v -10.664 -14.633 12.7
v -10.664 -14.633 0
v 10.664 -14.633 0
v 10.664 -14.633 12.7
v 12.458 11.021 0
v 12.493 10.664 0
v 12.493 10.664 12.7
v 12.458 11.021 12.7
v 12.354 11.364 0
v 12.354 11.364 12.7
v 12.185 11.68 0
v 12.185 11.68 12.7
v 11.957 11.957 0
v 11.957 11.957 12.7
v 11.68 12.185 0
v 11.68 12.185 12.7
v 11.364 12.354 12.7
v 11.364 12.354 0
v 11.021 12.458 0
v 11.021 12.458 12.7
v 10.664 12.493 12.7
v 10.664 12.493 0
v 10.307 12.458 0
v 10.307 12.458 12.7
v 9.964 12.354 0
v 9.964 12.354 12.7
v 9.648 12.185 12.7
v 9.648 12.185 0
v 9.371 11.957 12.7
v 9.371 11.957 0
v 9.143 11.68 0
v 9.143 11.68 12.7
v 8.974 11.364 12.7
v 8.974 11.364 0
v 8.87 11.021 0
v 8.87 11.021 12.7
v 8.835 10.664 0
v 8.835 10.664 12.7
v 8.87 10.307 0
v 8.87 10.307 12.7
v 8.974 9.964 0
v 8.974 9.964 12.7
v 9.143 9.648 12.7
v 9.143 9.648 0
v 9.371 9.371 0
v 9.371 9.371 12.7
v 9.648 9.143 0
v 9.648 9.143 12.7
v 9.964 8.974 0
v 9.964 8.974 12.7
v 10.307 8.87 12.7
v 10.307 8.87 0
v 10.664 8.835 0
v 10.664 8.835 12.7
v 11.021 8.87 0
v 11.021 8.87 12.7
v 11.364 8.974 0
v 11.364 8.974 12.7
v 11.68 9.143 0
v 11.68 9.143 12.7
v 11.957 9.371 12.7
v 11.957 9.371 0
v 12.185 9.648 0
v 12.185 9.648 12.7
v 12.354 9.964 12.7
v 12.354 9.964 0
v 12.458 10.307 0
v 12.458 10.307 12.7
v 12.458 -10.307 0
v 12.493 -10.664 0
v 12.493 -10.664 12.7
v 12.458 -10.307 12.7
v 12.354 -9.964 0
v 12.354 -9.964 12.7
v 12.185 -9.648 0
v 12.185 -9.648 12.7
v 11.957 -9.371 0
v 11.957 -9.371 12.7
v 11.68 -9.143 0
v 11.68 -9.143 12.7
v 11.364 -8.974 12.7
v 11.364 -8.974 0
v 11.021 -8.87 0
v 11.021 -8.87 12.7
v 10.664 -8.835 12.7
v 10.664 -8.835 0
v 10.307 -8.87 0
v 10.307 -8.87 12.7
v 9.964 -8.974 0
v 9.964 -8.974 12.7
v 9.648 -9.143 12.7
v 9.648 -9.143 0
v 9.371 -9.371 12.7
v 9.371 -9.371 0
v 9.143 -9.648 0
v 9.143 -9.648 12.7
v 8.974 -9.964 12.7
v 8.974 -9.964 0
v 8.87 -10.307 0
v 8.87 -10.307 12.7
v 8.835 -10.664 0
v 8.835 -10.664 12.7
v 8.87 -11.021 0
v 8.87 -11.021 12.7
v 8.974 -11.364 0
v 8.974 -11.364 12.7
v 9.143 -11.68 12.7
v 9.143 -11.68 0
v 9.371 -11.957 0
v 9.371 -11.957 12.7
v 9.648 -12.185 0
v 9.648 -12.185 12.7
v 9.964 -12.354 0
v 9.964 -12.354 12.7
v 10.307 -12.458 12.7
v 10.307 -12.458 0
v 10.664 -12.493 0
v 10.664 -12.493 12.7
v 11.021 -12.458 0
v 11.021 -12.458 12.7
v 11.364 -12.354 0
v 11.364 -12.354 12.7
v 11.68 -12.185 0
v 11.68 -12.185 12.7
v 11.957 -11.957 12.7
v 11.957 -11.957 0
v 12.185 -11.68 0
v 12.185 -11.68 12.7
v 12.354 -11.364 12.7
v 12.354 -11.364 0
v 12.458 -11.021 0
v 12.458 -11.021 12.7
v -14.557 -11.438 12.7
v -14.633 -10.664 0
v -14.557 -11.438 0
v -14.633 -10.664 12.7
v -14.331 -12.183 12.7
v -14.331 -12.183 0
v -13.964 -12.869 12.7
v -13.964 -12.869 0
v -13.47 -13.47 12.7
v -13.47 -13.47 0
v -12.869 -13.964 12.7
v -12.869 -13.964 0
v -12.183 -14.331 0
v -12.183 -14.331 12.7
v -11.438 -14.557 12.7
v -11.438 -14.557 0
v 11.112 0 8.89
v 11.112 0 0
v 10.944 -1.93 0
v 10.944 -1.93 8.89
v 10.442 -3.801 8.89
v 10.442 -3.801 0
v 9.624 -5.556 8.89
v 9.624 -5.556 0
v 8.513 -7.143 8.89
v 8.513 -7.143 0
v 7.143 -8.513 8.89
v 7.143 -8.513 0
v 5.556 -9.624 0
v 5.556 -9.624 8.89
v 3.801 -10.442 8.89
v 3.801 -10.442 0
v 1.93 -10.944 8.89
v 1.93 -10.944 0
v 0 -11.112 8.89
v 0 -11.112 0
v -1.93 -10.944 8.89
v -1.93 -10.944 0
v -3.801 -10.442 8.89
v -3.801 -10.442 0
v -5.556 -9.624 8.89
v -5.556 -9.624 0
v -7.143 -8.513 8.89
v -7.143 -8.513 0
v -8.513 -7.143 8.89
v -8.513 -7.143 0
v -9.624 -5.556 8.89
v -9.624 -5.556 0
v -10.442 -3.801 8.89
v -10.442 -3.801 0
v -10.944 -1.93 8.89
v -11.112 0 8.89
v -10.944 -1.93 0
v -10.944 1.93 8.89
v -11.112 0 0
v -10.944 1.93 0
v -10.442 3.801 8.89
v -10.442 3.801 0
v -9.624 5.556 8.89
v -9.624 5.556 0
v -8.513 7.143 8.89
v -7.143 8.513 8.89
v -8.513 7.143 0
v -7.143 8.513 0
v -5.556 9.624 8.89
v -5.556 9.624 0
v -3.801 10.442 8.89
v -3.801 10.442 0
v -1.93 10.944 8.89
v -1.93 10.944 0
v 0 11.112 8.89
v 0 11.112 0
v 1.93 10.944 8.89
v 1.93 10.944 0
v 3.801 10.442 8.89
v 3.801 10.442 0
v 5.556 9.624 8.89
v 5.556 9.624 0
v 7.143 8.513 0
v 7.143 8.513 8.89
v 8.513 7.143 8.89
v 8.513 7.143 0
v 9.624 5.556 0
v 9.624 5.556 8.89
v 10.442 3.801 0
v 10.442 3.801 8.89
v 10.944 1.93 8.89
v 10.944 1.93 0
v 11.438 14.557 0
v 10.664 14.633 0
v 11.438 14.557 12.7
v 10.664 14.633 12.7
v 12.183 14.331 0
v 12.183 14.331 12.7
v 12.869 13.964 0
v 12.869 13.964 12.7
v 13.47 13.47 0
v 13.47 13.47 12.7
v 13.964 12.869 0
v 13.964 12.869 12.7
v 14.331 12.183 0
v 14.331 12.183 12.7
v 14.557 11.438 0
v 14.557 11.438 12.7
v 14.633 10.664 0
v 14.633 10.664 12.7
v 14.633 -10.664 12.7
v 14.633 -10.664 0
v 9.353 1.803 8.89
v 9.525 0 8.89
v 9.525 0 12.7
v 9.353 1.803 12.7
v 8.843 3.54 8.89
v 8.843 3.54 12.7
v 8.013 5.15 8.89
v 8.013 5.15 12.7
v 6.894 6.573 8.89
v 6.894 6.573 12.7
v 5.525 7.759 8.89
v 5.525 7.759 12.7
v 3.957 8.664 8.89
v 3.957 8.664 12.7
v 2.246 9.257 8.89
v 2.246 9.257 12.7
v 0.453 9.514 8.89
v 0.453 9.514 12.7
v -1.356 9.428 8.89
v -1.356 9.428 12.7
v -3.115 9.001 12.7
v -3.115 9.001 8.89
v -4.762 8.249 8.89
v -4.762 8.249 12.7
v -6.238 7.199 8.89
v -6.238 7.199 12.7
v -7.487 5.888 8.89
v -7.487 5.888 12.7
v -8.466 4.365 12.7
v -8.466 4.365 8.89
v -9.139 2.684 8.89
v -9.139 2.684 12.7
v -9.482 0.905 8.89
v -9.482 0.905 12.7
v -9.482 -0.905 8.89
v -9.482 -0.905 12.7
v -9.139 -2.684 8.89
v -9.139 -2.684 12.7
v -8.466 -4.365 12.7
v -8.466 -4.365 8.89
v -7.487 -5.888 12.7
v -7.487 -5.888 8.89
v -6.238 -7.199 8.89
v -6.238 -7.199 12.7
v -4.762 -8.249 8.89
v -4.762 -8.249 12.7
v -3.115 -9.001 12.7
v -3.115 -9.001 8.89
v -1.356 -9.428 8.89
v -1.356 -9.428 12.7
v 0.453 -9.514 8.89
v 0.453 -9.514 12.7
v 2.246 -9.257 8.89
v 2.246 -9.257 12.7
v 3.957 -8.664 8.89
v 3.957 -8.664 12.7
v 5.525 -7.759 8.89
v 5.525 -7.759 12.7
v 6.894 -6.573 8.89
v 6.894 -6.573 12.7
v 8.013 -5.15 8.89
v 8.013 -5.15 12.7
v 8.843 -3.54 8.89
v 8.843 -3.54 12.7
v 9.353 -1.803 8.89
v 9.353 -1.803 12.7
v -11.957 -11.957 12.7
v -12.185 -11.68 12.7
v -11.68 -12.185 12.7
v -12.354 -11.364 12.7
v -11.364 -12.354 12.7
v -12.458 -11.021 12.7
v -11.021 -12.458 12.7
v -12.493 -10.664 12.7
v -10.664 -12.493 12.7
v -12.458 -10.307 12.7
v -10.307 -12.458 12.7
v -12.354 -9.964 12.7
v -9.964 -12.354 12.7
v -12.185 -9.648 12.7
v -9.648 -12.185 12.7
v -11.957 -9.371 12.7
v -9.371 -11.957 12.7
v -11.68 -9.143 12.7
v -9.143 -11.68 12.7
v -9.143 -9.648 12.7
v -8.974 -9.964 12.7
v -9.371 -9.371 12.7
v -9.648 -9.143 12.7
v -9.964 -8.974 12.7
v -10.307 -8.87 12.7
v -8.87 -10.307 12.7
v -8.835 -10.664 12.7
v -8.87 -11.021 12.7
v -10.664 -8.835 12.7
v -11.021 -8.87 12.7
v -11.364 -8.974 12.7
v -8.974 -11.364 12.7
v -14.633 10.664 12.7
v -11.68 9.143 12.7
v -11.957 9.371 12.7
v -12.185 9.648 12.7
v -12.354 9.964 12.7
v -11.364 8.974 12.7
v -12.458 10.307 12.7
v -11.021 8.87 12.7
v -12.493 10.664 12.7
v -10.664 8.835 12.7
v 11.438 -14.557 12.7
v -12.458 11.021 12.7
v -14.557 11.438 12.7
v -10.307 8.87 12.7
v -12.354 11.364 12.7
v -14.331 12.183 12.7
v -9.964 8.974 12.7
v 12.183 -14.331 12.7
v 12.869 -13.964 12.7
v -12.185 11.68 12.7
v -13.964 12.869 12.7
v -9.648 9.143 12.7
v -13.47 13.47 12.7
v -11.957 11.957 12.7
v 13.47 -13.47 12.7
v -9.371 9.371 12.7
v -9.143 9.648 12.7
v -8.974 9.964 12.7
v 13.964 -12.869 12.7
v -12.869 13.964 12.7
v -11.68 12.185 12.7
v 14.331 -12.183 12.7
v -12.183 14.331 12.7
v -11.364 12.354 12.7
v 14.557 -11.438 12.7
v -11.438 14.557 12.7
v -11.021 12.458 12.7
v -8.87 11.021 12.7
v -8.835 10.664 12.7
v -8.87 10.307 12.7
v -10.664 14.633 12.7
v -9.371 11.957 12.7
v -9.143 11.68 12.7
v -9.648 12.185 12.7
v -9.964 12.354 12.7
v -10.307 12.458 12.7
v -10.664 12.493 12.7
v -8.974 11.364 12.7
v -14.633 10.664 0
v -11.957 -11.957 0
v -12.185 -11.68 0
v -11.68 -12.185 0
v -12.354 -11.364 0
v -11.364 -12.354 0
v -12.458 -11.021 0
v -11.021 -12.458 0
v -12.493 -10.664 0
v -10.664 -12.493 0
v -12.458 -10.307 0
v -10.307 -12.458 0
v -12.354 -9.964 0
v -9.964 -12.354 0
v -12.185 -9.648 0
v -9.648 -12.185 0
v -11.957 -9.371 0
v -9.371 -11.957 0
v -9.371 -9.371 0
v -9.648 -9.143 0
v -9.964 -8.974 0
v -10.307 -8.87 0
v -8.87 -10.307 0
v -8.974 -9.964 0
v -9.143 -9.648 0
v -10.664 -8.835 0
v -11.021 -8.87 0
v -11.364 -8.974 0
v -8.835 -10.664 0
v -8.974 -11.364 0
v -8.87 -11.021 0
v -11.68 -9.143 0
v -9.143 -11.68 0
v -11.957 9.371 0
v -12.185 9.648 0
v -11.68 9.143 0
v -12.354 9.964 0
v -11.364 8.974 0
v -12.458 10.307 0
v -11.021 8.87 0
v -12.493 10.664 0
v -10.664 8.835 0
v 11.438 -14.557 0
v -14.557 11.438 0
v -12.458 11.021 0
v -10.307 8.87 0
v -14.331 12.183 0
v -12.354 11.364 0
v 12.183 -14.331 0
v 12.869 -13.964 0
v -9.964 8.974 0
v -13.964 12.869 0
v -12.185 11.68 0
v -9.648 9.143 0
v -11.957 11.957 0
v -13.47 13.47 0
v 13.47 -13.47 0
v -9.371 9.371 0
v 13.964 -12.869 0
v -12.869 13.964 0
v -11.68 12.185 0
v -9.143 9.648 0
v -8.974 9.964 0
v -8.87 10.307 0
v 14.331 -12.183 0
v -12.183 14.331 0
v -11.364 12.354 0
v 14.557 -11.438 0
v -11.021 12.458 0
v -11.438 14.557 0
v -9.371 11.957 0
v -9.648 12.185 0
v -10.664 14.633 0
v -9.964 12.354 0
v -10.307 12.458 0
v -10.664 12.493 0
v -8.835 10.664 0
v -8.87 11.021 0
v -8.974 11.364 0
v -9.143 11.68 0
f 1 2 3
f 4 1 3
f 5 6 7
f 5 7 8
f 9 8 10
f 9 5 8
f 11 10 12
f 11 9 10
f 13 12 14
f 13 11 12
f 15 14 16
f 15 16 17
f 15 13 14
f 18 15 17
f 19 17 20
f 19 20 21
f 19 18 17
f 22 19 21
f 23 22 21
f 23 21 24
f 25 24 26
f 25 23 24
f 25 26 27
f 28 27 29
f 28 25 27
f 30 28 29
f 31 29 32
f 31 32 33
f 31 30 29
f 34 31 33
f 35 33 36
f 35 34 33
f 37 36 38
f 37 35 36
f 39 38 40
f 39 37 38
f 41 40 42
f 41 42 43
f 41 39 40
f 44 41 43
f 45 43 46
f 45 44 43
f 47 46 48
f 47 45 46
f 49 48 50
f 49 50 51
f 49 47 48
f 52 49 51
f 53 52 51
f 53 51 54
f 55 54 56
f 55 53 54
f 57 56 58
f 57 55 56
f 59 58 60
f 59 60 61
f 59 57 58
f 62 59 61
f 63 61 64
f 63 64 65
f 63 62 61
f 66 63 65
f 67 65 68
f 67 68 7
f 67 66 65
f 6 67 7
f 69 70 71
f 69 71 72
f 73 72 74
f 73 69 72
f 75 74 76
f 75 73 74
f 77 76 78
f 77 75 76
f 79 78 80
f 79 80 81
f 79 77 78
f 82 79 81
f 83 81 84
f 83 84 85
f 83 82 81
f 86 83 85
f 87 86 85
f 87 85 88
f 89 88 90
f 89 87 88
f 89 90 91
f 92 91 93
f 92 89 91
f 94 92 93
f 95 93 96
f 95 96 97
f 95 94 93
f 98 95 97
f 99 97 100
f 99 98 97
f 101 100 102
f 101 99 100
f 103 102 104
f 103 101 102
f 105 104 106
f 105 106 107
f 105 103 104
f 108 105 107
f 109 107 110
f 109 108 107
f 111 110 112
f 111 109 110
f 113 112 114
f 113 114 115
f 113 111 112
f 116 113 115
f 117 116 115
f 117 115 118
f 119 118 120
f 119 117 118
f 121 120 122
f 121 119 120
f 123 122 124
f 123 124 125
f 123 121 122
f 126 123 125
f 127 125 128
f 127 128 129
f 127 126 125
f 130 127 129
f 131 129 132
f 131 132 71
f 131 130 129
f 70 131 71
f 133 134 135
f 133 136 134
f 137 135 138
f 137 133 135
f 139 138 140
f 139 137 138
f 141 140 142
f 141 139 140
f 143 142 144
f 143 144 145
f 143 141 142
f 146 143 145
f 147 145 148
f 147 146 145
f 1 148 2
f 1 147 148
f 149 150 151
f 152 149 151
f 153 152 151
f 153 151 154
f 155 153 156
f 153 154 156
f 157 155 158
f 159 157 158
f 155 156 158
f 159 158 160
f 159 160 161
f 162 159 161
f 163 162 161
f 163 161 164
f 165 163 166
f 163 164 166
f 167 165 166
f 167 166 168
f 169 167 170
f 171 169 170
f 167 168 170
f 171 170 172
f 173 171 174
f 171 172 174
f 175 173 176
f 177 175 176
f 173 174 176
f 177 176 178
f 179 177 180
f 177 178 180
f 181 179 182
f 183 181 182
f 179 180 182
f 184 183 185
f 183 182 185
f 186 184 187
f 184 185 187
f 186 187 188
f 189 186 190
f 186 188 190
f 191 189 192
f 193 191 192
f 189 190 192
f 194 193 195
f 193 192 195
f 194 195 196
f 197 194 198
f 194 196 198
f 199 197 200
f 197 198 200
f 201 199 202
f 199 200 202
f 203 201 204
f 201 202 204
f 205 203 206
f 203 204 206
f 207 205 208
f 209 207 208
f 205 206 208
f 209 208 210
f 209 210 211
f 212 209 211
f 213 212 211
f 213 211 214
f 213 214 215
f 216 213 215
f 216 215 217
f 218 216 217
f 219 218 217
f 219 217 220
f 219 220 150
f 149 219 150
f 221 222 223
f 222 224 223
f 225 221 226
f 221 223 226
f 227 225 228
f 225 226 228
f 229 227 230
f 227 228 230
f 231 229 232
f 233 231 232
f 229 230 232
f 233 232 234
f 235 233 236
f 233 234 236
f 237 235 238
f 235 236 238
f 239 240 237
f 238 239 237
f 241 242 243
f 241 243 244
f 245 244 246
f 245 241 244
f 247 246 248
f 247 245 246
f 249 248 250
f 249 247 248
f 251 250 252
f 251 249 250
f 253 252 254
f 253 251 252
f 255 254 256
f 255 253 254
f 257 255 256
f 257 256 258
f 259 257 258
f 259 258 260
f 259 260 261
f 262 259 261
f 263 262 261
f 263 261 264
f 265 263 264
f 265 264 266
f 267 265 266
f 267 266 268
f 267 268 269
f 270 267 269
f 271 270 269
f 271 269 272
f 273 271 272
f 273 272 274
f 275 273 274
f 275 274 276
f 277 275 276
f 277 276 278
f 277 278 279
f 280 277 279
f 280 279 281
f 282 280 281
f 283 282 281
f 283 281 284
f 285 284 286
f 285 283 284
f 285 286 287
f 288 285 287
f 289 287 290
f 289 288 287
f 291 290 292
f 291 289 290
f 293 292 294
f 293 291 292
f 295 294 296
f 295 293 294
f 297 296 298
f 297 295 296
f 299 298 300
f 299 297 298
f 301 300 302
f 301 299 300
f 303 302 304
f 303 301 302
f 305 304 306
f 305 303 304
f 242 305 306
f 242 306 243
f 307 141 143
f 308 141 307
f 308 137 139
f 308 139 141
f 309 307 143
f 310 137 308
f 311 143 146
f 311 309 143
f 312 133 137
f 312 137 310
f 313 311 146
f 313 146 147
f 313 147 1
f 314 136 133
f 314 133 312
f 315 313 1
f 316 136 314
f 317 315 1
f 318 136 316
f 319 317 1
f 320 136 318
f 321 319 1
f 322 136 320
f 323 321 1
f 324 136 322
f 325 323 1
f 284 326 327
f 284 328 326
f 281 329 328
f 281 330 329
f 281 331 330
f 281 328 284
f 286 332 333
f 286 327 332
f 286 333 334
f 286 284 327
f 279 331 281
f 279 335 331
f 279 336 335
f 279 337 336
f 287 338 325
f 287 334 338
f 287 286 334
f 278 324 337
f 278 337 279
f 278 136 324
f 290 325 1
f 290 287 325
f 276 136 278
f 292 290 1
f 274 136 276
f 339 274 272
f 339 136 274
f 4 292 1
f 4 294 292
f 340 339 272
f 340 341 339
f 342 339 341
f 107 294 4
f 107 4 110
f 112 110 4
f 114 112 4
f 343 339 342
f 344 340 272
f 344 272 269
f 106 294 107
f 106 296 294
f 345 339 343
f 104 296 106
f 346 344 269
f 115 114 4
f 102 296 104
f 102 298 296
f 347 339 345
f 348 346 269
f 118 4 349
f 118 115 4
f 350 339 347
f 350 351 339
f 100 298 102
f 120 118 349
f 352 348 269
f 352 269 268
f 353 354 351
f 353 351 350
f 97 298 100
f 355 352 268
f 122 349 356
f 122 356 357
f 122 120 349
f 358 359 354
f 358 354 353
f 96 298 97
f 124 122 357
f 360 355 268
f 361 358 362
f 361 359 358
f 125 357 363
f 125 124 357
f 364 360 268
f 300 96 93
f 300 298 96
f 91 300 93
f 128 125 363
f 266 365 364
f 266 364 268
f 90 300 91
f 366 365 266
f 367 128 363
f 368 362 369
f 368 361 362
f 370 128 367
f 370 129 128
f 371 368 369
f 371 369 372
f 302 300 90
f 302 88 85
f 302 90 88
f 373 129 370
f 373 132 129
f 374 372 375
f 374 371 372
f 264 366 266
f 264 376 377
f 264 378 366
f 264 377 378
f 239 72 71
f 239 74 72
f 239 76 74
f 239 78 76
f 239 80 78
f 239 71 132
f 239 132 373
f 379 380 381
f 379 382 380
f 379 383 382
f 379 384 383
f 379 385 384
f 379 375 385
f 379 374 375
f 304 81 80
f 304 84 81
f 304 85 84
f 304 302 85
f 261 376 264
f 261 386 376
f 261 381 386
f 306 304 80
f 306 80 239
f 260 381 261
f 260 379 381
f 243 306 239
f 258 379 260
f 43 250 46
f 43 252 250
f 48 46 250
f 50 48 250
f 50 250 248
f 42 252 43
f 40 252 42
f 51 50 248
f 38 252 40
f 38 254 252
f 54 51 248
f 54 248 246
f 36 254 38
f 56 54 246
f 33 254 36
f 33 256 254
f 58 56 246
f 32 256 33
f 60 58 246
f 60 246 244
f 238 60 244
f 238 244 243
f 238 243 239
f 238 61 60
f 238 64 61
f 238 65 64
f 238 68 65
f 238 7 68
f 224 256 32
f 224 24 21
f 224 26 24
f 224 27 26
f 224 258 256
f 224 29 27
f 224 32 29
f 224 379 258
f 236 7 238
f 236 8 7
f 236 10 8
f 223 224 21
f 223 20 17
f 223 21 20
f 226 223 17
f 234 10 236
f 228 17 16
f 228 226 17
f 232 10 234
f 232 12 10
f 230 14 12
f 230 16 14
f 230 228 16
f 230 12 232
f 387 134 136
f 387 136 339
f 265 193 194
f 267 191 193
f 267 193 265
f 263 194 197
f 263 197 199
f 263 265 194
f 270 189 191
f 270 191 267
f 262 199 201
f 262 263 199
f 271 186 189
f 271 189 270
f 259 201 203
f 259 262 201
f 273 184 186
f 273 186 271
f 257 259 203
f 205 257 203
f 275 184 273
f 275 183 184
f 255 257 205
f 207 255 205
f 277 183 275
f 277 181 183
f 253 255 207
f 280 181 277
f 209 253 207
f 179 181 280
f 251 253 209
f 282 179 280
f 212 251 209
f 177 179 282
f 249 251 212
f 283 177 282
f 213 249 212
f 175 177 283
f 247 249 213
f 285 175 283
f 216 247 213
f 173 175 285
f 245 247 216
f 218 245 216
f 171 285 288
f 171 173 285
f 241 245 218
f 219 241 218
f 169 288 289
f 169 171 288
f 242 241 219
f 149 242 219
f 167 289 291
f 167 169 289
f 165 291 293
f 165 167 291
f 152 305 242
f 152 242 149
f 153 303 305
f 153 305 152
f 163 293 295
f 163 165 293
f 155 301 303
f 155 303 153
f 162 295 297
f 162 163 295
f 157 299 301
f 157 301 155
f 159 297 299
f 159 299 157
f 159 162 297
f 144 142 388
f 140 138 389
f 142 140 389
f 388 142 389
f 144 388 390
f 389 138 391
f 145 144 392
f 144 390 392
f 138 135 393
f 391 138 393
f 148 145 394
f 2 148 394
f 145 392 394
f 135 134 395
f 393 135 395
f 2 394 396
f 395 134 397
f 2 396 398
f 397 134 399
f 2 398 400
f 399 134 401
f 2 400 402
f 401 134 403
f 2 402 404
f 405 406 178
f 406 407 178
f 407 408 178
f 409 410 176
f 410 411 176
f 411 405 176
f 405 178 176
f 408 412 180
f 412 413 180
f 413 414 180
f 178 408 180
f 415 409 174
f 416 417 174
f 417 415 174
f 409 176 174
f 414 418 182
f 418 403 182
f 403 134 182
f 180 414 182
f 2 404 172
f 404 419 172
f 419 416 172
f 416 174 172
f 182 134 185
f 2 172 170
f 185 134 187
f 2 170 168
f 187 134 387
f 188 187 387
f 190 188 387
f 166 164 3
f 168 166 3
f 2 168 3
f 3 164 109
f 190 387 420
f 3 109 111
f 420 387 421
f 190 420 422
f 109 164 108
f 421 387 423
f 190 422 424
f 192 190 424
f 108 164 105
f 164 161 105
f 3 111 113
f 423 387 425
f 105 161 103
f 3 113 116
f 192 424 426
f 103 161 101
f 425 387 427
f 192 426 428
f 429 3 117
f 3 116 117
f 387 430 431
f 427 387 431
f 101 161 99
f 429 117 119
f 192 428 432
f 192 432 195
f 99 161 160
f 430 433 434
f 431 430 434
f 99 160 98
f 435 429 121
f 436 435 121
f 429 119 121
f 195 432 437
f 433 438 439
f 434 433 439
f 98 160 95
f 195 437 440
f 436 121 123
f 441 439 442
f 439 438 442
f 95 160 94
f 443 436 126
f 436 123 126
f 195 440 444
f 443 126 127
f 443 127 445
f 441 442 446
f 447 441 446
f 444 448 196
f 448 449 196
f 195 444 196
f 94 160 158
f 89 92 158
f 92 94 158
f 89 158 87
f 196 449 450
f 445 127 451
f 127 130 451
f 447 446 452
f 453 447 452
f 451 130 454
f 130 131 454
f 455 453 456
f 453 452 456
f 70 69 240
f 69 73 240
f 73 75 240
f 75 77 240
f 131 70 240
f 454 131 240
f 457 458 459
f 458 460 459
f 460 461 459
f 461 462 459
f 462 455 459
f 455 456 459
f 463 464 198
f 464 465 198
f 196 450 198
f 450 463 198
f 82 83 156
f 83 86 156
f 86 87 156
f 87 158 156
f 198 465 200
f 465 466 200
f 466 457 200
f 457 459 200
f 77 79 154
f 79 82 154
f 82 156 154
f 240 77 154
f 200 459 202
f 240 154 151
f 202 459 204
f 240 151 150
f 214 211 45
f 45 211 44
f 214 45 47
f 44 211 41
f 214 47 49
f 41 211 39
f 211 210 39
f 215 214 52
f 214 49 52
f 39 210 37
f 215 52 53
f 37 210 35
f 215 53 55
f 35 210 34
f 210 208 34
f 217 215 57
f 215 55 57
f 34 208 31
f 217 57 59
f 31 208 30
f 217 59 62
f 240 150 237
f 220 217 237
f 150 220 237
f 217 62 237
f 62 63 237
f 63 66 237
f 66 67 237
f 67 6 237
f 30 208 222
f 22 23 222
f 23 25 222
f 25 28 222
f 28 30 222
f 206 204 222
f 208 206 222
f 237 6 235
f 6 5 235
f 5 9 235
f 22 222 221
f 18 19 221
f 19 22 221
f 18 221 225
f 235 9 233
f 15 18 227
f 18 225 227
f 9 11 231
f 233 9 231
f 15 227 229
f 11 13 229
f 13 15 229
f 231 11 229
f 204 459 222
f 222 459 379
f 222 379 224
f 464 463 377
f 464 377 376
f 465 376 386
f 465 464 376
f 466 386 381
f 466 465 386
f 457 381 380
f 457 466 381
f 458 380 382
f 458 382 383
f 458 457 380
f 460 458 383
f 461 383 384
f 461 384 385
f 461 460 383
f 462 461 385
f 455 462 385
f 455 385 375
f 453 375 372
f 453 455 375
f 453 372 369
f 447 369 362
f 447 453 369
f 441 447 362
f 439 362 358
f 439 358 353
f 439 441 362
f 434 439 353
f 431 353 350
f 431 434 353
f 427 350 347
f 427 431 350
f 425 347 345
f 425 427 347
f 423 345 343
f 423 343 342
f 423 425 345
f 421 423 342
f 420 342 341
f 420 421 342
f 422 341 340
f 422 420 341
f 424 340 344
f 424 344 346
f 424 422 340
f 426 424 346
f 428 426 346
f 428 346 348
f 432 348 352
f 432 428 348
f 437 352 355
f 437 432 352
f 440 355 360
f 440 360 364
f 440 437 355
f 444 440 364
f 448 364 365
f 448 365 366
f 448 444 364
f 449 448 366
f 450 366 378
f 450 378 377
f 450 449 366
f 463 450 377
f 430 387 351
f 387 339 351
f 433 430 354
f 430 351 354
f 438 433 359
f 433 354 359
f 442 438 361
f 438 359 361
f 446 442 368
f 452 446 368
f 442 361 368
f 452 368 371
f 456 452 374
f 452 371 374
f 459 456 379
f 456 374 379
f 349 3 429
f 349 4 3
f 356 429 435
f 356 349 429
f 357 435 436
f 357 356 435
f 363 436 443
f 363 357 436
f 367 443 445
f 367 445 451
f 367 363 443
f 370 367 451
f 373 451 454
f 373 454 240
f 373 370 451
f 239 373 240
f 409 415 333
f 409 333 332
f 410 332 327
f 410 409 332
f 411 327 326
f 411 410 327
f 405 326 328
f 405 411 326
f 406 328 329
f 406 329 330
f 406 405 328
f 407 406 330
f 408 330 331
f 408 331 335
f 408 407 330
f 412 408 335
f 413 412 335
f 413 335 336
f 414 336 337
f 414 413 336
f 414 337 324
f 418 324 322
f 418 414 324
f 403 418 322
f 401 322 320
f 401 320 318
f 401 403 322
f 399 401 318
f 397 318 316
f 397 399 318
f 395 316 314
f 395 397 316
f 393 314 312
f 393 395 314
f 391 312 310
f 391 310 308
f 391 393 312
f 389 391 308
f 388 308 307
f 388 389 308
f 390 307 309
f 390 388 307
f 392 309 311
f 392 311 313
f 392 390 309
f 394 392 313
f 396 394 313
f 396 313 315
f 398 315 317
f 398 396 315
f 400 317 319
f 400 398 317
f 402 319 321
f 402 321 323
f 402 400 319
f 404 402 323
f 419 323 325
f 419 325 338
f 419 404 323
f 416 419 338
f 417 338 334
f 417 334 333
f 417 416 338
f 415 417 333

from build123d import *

# Parameters (mm, degrees)
F0_W     = 29.265608
F0_H     = 29.265608
F0_R     = 1.8288
F0_R_2   = 9.525
F1_DEPTH = 12.7
F2_R     = 3.96875
F3_R     = 11.1125
F4_DEPTH = 8.89


with BuildPart() as f1:
    # F0 (on Top) → F1 (new body)
    with BuildSketch(Plane.XY):
        Rectangle(F0_W, F0_H)
        with Locations((-10.664054, -10.664054)):
            Circle(F0_R, mode=Mode.SUBTRACT)
        with Locations((10.664054, -10.664054)):
            Circle(F0_R, mode=Mode.SUBTRACT)
        with Locations((-10.664054, 10.664054)):
            Circle(F0_R, mode=Mode.SUBTRACT)
        Circle(F0_R_2, mode=Mode.SUBTRACT)
        with Locations((10.664054, 10.664054)):
            Circle(F0_R, mode=Mode.SUBTRACT)
    extrude(amount=F1_DEPTH)

    # F2
    f2_edges = [f1.edges().sort_by_distance(p)[0] for p in [
        (-14.632804, 14.632804, 6.35),
        (-14.632804, -14.632804, 6.35),
        (14.632804, -14.632804, 6.35),
        (14.632804, 14.632804, 6.35),
    ]]
    fillet(f2_edges, radius=F2_R)

    # F3 (on face) → F4 (cut)
    with BuildSketch(Plane(origin=(0, 0, 0), x_dir=(1, 0, 0), z_dir=(0, 0, -1))):
        Circle(F3_R)
    extrude(amount=-F4_DEPTH, mode=Mode.SUBTRACT)


solid = f1.part
